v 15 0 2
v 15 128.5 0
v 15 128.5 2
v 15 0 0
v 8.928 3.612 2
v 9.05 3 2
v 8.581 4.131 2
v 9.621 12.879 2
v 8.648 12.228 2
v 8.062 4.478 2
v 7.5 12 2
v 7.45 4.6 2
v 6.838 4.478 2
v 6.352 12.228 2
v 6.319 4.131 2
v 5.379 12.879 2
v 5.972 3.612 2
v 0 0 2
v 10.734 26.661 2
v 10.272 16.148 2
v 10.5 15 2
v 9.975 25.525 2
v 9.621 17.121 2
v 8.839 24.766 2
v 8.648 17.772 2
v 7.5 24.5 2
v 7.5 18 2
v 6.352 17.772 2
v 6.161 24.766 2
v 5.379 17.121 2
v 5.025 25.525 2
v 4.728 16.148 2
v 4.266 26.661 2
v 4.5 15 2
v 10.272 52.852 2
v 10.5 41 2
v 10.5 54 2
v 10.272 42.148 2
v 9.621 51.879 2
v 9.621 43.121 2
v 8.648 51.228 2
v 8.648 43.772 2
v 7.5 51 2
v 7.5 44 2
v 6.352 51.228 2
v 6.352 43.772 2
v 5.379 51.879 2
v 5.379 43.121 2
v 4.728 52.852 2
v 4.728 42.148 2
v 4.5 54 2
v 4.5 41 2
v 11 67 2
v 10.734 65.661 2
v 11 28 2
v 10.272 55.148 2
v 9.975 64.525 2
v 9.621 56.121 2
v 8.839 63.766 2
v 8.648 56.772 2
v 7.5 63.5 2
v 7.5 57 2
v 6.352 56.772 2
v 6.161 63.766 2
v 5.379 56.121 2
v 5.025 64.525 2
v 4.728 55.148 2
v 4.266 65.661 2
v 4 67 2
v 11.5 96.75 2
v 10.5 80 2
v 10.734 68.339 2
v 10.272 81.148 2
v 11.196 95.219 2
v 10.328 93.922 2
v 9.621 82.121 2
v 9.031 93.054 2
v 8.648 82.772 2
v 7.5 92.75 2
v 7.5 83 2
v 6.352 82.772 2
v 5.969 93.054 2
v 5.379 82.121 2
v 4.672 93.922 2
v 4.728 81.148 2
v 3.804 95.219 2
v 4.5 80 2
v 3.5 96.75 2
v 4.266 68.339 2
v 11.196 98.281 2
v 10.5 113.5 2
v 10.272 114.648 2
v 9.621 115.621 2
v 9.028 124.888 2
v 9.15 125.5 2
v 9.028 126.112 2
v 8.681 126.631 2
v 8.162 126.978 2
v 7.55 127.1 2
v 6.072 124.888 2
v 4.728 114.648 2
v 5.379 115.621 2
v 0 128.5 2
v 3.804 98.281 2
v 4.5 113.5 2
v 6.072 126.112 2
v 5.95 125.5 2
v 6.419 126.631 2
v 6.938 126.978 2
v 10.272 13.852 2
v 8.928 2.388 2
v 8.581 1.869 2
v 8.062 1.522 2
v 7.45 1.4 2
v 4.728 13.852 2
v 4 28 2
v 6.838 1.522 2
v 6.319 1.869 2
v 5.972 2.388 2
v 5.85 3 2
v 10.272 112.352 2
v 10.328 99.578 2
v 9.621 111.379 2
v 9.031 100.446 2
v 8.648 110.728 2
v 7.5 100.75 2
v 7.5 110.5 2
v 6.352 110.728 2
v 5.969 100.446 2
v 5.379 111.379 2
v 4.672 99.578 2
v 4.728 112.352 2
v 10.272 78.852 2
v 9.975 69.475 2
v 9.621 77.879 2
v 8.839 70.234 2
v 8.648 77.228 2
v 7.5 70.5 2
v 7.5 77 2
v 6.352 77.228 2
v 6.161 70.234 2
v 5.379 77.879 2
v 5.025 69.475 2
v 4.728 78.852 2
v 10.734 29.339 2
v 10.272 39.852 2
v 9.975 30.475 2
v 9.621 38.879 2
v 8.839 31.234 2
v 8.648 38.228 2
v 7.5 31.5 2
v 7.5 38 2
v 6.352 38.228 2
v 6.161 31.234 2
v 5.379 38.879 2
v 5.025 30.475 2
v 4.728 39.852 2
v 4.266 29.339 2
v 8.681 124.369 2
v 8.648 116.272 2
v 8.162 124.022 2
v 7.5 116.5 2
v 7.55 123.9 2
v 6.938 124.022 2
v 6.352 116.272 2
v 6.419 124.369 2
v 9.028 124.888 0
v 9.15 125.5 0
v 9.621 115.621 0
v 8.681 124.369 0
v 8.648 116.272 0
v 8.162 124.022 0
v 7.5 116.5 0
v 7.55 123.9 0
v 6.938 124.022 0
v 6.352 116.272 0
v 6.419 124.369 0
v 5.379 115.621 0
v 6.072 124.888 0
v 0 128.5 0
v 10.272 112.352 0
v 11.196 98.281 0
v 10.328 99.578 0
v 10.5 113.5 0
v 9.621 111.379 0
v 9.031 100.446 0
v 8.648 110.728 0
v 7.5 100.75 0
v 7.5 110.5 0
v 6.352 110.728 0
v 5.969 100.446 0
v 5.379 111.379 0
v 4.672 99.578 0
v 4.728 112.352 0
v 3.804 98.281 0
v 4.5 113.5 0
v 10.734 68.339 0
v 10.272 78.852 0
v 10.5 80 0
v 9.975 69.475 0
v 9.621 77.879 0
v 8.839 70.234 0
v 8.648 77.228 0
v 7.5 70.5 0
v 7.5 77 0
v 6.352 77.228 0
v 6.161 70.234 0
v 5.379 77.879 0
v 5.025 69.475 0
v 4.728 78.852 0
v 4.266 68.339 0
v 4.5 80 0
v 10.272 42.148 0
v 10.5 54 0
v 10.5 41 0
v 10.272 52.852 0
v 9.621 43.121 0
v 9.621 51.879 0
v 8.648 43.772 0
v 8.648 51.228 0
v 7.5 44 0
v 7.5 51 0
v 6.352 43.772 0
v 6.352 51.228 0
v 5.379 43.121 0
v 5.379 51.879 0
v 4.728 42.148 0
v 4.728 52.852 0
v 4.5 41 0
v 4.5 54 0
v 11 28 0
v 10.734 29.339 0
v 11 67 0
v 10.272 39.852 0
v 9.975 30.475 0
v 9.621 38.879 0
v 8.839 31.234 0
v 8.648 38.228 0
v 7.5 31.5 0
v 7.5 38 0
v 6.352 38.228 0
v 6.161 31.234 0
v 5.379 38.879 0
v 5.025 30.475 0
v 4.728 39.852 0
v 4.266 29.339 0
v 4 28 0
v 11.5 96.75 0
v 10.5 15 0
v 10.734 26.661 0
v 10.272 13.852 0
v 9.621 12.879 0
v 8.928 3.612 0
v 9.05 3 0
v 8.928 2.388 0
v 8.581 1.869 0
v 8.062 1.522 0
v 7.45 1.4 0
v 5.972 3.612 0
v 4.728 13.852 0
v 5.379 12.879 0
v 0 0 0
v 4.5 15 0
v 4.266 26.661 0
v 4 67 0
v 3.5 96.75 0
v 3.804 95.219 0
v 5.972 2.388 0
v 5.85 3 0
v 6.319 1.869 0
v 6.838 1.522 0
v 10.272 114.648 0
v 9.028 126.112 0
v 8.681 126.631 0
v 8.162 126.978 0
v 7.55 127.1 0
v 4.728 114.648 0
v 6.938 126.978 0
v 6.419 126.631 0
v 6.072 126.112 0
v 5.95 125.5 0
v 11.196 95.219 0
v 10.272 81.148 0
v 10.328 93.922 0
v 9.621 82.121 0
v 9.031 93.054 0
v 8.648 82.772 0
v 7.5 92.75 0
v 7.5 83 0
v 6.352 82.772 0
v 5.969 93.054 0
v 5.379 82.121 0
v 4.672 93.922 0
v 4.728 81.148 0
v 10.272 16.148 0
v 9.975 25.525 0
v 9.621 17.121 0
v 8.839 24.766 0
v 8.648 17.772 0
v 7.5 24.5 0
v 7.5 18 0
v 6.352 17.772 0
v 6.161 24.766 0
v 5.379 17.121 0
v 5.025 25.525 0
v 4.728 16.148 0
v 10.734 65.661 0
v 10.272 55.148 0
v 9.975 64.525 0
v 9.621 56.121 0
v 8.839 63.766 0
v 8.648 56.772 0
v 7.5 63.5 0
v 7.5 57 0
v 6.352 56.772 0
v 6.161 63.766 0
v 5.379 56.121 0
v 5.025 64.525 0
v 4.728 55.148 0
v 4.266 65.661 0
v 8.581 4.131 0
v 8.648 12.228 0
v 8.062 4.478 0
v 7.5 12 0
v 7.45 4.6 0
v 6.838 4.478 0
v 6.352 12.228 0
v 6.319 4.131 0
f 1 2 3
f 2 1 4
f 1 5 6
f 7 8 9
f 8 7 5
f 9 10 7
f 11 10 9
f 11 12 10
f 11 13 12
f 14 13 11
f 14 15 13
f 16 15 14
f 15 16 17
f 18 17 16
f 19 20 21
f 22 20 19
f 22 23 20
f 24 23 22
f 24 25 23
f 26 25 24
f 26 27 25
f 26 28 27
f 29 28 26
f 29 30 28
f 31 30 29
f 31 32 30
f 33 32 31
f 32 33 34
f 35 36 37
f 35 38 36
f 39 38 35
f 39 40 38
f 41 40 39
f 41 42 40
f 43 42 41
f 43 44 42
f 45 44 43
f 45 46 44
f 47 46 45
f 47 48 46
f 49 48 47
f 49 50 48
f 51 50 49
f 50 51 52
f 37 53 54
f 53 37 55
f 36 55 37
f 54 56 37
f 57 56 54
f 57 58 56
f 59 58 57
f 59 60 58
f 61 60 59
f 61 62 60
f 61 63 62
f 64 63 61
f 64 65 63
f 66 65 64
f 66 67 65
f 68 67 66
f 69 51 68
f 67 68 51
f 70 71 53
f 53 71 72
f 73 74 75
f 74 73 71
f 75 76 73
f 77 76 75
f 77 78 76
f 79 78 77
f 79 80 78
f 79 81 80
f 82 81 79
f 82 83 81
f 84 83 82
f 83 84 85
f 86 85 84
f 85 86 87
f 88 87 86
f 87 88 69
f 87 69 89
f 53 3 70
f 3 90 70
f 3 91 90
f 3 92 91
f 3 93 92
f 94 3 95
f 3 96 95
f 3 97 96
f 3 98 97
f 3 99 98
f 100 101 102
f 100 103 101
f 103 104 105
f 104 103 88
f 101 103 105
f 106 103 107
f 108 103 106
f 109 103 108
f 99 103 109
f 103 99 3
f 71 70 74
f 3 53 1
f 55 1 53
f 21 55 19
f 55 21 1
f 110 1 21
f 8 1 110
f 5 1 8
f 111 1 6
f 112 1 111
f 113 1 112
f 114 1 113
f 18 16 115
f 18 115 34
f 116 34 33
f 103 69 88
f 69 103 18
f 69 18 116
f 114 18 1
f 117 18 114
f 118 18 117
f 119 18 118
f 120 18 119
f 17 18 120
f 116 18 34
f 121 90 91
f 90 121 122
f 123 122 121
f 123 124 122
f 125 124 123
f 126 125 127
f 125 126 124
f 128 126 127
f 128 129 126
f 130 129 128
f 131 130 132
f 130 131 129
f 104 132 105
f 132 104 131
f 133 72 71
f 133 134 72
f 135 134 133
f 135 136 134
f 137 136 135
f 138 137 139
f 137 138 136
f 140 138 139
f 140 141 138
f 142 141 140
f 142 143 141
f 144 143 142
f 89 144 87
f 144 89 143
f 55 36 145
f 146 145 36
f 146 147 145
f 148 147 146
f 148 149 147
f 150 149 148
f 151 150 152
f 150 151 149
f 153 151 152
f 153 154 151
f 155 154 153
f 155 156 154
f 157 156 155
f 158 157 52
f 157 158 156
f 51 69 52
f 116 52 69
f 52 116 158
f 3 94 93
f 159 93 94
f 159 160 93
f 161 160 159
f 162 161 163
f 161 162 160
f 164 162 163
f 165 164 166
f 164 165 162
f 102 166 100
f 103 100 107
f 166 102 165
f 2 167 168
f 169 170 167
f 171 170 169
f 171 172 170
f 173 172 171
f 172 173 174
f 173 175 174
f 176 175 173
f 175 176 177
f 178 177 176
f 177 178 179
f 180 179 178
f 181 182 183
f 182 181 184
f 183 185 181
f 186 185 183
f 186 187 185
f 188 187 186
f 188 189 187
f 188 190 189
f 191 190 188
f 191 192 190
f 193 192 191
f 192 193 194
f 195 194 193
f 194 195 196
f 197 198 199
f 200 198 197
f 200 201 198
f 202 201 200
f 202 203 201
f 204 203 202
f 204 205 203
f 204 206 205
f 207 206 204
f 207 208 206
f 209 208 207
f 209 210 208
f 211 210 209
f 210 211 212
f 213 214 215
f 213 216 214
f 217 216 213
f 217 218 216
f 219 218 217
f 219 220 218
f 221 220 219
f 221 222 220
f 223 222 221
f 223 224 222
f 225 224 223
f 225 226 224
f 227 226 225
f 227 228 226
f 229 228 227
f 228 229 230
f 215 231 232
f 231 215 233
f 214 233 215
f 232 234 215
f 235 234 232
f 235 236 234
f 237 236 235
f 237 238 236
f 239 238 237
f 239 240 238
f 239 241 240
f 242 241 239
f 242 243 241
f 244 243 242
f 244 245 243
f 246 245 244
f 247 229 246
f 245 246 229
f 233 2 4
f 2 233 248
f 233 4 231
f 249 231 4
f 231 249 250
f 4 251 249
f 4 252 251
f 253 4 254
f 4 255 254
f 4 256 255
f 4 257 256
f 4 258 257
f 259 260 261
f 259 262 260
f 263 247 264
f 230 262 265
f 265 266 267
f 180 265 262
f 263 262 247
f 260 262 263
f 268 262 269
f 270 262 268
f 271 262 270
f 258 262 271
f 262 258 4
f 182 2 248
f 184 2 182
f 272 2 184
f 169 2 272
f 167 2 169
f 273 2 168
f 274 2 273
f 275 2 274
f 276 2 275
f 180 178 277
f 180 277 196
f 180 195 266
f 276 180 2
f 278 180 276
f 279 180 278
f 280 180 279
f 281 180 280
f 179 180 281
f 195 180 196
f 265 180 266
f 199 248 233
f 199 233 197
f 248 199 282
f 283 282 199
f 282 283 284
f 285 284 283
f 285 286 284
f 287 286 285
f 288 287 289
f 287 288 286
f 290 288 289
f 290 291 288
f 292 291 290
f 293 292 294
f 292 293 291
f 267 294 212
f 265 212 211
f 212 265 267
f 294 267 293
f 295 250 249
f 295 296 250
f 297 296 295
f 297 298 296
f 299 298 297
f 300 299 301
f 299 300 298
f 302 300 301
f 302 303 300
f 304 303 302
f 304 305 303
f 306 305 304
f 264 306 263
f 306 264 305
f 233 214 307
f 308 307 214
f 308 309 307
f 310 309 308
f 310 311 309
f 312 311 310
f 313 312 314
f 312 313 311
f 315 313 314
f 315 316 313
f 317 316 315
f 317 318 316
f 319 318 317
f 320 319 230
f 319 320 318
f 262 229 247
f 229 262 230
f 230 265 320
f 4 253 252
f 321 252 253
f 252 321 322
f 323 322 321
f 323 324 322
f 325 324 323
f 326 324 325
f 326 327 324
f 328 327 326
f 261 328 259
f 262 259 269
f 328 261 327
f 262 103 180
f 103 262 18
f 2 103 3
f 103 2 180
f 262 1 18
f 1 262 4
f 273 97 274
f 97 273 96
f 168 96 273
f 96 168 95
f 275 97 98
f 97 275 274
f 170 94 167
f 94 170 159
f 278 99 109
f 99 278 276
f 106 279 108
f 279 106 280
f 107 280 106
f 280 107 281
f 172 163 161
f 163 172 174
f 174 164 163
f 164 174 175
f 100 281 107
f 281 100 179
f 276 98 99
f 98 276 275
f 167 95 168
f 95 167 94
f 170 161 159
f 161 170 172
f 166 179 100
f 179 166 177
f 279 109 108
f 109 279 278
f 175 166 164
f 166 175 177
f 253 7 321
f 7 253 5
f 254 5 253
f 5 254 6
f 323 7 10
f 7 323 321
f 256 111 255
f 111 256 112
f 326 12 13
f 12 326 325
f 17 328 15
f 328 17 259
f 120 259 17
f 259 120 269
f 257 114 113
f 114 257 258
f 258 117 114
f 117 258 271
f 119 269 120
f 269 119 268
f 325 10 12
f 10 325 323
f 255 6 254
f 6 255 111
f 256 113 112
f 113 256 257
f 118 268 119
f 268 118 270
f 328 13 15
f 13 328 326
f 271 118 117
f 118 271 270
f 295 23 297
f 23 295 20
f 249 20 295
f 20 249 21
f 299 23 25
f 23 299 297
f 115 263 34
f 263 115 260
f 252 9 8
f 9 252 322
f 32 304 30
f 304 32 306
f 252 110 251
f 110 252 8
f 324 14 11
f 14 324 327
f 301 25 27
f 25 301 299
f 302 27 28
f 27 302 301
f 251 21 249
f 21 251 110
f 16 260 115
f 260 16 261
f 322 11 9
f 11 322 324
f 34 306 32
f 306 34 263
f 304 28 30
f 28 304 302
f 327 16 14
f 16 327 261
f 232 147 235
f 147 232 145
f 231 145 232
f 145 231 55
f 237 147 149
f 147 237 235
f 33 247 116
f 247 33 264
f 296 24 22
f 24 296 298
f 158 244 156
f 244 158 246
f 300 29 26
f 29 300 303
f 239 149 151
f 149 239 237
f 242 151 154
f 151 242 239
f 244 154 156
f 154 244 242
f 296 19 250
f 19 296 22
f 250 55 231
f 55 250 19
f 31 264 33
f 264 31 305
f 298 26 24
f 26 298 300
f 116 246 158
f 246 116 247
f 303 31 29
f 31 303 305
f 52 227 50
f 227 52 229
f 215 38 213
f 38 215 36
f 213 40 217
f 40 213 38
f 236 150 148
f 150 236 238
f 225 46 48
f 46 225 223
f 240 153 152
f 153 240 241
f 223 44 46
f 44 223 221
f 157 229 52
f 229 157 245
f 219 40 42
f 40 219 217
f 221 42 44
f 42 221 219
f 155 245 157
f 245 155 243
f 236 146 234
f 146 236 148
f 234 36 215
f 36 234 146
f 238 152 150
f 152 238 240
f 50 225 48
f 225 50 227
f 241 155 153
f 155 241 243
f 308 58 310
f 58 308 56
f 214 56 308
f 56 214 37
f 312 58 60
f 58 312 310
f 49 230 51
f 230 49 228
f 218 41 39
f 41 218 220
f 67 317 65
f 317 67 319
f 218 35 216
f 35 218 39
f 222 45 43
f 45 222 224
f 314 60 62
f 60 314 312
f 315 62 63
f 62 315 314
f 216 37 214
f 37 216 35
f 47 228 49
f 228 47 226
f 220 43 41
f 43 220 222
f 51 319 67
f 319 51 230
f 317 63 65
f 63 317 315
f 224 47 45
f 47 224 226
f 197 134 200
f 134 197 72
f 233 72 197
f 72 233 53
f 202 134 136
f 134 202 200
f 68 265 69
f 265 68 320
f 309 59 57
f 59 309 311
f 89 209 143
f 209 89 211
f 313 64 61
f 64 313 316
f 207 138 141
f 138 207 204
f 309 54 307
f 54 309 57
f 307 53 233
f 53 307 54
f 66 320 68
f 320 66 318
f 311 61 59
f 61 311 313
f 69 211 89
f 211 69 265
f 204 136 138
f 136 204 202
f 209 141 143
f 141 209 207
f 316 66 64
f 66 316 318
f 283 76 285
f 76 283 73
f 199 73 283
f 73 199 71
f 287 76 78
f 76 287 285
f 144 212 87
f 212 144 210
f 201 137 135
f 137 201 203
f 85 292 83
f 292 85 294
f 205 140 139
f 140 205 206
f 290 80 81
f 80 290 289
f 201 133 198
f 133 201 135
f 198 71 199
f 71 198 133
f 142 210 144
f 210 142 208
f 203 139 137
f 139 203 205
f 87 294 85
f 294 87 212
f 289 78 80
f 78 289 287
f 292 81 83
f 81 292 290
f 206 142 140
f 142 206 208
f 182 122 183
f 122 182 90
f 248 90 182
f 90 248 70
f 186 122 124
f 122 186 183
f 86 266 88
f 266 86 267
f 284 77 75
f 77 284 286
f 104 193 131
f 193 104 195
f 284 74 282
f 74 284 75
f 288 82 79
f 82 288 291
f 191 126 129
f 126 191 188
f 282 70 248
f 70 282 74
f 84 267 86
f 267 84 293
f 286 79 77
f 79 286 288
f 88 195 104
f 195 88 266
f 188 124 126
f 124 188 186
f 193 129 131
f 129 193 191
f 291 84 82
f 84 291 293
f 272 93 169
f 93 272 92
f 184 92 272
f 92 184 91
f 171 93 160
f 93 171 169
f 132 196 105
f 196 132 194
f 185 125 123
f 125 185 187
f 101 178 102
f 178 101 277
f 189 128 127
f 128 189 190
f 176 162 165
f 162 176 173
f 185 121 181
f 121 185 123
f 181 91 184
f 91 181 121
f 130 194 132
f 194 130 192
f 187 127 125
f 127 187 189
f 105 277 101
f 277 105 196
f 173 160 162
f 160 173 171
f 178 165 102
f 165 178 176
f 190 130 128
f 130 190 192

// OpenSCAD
$fn=16;

// Dimensions
panel_width = floor(3 * 5.08);    // 3HP
panel_height = 128.5;  // 3U
panel_thickness = 2.00;

// Mounting holes
mount_offset_y = 3;
mount_offset_x = 7.45;
mounting_hole_diameter = 3.2; // M3

// Compoonent hole sizes
jack_hole_diameter = 6; // 3.5mm
toggle_hole_diameter = 7;
pot_hole_diameter = 8;

module jack(y_pos) {
    translate([panel_width / 2, y_pos, panel_thickness / 2])
        cylinder(d = jack_hole_diameter, h = panel_thickness + 1, center = true);
}

module toggle(y_pos) {
    translate([panel_width / 2, y_pos, panel_thickness / 2])
        cylinder(d = toggle_hole_diameter, h = panel_thickness + 1, center = true);
}

module pot(y_pos) {
    translate([panel_width / 2, y_pos, panel_thickness / 2])
        cylinder(d = pot_hole_diameter, h = panel_thickness + 1, center = true);
}

module mounting_hole(x_pos, y_pos) {
    translate([x_pos, y_pos, panel_thickness / 2])
        cylinder(d = mounting_hole_diameter, h = panel_thickness + 1, center = true);
}


jack_height = 10;
toggle_height = 15;
pot_height = 22.5;

buffer = 0.5;

jack2toggle_y = (jack_height + toggle_height) / 2 + buffer;
jack2jack_y = jack_height + buffer;
jack2pot_y = (jack_height + pot_height) / 2 + buffer;

jack1_y = 15;
toggle1_y = jack1_y + jack2toggle_y;
jack2_y = toggle1_y + jack2toggle_y;
jack3_y = jack2_y + jack2toggle_y;
toggle2_y = jack3_y + jack2toggle_y;
jack4_y = toggle2_y + jack2toggle_y;
pot1_y = jack4_y + jack2pot_y;
jack5_y = pot1_y + jack2pot_y;

module panel() {
    difference() {
        // Base panel
        cube([panel_width, panel_height, panel_thickness]);

        // Mounting holes
        mounting_hole(panel_width - mount_offset_x, panel_height - mount_offset_y);
        mounting_hole(mount_offset_x, mount_offset_y);

        // Components (Jacks, Toggles, Pot)
        jack(jack1_y);
        toggle(toggle1_y);
        jack(jack2_y);
        jack(jack3_y);
        toggle(toggle2_y);
        jack(jack4_y);
        pot(pot1_y);
        jack(jack5_y);
    }
}

panel();
